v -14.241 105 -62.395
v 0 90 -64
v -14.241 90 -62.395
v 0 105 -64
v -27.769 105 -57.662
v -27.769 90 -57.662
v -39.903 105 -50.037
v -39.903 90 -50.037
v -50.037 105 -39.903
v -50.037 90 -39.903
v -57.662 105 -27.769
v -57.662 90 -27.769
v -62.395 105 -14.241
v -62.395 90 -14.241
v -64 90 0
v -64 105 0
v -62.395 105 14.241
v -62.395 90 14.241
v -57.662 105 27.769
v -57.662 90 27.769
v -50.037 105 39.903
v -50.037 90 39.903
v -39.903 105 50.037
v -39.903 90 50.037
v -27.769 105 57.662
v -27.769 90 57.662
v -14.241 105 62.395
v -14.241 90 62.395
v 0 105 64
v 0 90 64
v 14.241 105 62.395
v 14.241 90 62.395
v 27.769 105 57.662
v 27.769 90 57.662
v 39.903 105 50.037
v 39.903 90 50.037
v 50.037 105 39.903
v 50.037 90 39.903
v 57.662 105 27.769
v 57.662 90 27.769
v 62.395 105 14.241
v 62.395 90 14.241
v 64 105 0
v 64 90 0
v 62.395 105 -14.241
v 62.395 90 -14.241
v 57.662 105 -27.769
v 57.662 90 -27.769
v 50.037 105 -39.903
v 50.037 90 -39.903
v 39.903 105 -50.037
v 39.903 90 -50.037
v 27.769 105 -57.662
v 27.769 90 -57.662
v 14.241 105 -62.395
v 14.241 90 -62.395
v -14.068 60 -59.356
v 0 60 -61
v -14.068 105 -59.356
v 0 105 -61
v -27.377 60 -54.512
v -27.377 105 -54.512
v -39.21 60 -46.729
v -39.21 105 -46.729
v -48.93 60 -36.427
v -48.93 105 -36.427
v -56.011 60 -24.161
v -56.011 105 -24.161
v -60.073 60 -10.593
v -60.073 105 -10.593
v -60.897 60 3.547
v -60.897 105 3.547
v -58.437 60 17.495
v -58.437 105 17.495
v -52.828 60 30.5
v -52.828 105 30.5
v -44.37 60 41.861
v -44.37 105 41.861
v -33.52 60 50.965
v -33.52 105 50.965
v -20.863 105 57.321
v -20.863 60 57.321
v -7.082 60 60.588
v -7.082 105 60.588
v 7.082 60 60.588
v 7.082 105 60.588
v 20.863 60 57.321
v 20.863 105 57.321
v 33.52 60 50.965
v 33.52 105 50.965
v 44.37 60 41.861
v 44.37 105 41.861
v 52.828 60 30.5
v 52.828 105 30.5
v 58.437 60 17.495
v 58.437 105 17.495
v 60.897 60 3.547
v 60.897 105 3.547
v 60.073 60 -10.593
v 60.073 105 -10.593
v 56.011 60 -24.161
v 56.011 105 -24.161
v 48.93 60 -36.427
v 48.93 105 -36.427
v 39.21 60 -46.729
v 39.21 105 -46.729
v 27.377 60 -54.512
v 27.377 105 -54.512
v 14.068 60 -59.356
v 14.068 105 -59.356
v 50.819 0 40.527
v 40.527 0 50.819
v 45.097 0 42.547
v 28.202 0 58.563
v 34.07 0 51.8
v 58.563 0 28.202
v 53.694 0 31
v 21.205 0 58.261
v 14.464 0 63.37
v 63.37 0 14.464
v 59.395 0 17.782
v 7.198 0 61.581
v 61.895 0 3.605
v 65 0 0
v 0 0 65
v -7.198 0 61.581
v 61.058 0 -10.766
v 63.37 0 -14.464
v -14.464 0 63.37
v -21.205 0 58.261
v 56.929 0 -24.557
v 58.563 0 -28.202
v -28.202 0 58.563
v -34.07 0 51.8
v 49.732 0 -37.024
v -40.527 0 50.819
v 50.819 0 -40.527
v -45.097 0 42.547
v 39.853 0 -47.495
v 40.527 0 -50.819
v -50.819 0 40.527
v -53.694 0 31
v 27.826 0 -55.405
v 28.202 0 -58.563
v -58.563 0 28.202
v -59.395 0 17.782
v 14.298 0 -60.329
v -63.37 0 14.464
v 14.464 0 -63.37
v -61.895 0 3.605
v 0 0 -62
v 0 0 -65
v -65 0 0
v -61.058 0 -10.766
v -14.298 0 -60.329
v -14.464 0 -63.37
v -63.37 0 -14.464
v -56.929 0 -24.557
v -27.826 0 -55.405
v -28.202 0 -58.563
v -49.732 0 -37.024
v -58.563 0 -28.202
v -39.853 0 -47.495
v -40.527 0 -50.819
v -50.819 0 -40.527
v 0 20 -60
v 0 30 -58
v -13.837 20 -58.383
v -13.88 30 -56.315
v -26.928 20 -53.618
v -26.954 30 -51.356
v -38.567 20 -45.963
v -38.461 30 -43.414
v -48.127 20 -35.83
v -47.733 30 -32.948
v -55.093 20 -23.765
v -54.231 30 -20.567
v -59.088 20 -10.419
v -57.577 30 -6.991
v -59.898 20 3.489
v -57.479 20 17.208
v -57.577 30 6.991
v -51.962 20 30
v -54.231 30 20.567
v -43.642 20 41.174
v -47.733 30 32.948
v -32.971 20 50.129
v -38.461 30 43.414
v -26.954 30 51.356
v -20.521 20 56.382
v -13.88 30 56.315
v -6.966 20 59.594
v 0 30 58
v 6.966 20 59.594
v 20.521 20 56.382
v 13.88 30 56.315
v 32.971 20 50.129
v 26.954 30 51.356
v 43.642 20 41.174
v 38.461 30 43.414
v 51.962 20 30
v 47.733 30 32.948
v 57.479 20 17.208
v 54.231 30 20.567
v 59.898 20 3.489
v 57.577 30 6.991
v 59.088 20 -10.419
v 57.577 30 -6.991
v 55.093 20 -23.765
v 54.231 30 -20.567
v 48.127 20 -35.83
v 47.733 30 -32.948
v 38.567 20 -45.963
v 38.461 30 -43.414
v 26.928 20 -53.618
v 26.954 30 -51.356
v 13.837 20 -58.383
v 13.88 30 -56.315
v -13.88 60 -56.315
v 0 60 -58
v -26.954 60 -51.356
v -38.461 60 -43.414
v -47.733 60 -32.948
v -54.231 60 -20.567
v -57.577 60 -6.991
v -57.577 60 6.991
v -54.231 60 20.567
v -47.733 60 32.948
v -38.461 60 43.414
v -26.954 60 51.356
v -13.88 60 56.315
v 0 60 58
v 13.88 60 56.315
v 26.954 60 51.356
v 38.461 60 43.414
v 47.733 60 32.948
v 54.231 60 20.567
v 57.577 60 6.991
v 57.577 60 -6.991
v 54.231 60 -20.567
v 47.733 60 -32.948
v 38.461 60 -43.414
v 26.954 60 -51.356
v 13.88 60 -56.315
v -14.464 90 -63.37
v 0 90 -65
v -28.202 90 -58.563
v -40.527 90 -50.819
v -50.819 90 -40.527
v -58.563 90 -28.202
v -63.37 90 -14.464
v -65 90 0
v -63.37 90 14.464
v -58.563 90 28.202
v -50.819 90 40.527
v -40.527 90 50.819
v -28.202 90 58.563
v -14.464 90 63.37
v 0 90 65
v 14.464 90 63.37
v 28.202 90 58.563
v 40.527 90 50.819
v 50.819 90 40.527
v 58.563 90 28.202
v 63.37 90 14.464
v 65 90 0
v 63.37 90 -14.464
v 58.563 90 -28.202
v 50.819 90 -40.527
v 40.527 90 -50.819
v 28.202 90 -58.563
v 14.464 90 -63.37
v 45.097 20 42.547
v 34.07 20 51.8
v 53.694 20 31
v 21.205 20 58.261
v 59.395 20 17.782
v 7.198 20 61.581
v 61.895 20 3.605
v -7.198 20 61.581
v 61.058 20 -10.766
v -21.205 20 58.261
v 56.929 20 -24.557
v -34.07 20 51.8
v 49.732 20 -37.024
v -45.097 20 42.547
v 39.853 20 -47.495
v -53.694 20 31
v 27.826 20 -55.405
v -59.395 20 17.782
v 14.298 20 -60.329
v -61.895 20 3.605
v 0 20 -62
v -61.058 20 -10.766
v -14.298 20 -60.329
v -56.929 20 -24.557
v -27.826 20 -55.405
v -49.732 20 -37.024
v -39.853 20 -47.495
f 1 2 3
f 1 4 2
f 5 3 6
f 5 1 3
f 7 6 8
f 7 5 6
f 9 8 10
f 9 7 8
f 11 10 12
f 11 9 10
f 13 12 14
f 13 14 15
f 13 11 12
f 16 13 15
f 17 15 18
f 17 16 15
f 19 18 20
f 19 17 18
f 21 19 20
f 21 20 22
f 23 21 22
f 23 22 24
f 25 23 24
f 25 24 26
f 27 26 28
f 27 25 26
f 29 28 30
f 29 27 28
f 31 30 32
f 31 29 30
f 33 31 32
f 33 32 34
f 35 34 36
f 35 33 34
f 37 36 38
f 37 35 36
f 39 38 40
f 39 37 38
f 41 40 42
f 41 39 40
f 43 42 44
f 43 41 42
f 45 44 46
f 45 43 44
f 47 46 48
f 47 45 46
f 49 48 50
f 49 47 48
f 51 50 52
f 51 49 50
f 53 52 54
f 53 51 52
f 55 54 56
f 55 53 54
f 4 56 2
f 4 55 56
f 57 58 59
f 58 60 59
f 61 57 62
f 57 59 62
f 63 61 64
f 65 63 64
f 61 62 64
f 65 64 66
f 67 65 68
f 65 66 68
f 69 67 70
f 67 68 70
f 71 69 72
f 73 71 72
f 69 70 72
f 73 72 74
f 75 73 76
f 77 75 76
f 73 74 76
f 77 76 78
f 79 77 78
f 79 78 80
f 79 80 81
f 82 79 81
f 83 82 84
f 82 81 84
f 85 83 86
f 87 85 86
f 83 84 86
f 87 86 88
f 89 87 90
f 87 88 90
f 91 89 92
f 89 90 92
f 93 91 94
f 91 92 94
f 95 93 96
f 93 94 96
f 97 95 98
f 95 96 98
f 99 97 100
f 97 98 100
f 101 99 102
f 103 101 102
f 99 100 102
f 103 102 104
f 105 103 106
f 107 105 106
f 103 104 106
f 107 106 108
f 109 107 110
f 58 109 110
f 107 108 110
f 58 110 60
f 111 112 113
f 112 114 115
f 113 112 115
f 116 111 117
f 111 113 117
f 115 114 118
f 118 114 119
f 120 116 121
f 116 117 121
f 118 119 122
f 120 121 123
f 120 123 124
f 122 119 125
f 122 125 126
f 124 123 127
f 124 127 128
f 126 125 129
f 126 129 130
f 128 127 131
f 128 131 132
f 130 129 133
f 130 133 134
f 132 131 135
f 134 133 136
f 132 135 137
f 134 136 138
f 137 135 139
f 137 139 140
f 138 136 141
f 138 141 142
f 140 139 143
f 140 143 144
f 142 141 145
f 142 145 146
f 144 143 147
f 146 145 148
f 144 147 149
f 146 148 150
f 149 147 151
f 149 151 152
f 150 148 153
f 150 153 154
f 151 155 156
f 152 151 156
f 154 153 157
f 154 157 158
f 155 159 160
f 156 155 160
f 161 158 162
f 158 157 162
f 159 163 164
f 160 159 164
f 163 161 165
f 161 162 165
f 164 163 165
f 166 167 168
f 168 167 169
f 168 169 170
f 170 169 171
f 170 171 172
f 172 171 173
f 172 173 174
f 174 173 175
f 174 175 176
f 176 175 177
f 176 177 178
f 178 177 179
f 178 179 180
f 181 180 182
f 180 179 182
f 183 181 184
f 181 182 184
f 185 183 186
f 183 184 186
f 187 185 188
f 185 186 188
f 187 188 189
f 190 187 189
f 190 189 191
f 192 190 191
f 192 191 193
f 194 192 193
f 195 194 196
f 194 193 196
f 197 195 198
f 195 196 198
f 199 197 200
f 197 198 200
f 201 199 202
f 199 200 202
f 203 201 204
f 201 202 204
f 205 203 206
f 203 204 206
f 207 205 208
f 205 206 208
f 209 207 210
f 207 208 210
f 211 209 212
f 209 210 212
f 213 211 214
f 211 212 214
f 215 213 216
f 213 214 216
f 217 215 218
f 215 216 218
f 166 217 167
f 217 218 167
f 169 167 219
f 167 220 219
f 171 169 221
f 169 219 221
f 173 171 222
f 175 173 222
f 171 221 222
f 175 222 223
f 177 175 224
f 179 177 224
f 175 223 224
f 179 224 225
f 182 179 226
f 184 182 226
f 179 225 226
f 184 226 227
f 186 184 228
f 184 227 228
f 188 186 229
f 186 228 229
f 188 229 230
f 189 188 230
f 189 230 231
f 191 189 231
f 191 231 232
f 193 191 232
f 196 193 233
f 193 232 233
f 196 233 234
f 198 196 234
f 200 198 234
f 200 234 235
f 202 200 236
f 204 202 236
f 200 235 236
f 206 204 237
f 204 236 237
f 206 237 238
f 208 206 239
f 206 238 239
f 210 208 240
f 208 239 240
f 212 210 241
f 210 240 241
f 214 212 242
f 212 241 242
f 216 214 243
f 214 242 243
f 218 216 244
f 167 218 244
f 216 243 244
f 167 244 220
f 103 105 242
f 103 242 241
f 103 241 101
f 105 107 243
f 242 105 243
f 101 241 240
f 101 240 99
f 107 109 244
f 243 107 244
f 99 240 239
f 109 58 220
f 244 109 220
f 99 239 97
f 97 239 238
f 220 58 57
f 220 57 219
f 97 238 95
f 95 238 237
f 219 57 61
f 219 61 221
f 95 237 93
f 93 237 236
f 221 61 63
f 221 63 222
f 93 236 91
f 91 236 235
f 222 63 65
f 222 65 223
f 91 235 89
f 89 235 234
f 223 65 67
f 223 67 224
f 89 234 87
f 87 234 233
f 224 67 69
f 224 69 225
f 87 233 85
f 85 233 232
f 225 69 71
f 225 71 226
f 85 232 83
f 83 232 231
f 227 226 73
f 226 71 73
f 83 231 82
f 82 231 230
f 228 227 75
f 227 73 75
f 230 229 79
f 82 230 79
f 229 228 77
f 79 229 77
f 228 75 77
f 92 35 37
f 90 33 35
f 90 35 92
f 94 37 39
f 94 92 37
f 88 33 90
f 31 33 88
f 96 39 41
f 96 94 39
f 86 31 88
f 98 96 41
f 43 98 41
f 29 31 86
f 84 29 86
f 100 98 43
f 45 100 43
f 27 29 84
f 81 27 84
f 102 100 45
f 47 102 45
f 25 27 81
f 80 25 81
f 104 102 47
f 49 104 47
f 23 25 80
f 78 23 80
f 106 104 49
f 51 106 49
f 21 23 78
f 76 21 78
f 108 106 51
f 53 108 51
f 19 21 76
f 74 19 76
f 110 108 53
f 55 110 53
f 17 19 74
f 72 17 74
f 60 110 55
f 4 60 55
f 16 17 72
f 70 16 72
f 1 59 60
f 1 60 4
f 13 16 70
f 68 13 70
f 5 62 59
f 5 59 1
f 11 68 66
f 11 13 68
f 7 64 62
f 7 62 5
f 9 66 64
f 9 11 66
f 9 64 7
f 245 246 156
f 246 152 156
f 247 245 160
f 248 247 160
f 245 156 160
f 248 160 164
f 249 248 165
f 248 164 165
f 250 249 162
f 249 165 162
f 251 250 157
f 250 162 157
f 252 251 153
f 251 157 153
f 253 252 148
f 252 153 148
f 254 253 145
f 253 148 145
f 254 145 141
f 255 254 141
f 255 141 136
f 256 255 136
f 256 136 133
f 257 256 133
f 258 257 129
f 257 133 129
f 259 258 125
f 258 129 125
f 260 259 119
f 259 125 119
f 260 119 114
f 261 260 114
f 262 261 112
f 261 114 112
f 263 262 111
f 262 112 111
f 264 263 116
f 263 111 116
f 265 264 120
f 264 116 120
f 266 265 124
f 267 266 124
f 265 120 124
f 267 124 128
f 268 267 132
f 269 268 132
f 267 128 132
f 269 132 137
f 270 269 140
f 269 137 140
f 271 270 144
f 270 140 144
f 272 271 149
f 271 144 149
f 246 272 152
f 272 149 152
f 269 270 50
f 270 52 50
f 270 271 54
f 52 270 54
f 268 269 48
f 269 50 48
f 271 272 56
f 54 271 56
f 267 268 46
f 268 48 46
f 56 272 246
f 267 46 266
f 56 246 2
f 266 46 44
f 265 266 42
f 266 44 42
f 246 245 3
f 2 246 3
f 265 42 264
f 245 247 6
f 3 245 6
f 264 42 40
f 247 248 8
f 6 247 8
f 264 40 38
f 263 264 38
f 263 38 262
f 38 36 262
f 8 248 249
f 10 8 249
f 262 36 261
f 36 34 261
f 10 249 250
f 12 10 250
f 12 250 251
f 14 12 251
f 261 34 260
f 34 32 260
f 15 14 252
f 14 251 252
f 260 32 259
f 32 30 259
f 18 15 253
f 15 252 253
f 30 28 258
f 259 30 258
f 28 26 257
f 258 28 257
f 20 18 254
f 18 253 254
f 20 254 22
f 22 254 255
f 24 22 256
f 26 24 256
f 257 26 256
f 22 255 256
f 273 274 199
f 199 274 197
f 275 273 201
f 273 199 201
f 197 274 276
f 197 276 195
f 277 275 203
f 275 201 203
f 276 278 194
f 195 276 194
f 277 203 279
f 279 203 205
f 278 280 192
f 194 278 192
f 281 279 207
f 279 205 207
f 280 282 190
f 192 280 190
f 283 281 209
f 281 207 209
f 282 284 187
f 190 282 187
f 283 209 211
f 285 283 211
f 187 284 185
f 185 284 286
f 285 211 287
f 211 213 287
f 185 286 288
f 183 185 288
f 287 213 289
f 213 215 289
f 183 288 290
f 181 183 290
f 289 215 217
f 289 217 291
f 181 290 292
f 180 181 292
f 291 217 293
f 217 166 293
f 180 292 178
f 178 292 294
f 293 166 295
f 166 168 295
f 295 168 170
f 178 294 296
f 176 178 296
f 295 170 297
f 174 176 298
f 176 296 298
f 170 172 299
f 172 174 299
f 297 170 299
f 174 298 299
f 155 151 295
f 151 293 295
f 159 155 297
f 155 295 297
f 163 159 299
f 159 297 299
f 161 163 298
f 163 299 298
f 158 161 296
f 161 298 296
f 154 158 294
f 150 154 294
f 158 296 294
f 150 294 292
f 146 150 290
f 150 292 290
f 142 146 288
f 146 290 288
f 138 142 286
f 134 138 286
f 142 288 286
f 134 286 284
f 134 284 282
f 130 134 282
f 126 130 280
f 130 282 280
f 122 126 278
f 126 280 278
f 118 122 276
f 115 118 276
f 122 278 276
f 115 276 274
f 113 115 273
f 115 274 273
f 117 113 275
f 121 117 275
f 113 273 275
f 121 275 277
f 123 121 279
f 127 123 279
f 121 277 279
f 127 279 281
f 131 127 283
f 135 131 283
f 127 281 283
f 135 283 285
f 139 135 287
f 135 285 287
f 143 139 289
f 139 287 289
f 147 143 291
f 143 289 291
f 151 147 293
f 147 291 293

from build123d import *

# Parameters (mm, degrees)
SZKIC1_W = 3
SZKIC1_H = 15


with BuildPart() as part:
    # Szkic1 → Obrót1 (revolve)
    with BuildSketch(Plane.XY, mode=Mode.PRIVATE) as obr_t1_sk:
        Polygon((-65, 0), (-62, 0), (-62, 20), (-60, 20), (-58, 30), (-58, 60), (-61, 60), (-61, 90), (-64, 90), (-65, 90), (-65, 20), align=None)
        with Locations((-62.5, 97.5)):
            Rectangle(SZKIC1_W, SZKIC1_H)
    revolve(obr_t1_sk.sketch.rotate(Axis((0, 0, 0), (0, 1, 0)), 270), axis=Axis((0, 0, 0), (0, 1, 0)))


solid = part.part
